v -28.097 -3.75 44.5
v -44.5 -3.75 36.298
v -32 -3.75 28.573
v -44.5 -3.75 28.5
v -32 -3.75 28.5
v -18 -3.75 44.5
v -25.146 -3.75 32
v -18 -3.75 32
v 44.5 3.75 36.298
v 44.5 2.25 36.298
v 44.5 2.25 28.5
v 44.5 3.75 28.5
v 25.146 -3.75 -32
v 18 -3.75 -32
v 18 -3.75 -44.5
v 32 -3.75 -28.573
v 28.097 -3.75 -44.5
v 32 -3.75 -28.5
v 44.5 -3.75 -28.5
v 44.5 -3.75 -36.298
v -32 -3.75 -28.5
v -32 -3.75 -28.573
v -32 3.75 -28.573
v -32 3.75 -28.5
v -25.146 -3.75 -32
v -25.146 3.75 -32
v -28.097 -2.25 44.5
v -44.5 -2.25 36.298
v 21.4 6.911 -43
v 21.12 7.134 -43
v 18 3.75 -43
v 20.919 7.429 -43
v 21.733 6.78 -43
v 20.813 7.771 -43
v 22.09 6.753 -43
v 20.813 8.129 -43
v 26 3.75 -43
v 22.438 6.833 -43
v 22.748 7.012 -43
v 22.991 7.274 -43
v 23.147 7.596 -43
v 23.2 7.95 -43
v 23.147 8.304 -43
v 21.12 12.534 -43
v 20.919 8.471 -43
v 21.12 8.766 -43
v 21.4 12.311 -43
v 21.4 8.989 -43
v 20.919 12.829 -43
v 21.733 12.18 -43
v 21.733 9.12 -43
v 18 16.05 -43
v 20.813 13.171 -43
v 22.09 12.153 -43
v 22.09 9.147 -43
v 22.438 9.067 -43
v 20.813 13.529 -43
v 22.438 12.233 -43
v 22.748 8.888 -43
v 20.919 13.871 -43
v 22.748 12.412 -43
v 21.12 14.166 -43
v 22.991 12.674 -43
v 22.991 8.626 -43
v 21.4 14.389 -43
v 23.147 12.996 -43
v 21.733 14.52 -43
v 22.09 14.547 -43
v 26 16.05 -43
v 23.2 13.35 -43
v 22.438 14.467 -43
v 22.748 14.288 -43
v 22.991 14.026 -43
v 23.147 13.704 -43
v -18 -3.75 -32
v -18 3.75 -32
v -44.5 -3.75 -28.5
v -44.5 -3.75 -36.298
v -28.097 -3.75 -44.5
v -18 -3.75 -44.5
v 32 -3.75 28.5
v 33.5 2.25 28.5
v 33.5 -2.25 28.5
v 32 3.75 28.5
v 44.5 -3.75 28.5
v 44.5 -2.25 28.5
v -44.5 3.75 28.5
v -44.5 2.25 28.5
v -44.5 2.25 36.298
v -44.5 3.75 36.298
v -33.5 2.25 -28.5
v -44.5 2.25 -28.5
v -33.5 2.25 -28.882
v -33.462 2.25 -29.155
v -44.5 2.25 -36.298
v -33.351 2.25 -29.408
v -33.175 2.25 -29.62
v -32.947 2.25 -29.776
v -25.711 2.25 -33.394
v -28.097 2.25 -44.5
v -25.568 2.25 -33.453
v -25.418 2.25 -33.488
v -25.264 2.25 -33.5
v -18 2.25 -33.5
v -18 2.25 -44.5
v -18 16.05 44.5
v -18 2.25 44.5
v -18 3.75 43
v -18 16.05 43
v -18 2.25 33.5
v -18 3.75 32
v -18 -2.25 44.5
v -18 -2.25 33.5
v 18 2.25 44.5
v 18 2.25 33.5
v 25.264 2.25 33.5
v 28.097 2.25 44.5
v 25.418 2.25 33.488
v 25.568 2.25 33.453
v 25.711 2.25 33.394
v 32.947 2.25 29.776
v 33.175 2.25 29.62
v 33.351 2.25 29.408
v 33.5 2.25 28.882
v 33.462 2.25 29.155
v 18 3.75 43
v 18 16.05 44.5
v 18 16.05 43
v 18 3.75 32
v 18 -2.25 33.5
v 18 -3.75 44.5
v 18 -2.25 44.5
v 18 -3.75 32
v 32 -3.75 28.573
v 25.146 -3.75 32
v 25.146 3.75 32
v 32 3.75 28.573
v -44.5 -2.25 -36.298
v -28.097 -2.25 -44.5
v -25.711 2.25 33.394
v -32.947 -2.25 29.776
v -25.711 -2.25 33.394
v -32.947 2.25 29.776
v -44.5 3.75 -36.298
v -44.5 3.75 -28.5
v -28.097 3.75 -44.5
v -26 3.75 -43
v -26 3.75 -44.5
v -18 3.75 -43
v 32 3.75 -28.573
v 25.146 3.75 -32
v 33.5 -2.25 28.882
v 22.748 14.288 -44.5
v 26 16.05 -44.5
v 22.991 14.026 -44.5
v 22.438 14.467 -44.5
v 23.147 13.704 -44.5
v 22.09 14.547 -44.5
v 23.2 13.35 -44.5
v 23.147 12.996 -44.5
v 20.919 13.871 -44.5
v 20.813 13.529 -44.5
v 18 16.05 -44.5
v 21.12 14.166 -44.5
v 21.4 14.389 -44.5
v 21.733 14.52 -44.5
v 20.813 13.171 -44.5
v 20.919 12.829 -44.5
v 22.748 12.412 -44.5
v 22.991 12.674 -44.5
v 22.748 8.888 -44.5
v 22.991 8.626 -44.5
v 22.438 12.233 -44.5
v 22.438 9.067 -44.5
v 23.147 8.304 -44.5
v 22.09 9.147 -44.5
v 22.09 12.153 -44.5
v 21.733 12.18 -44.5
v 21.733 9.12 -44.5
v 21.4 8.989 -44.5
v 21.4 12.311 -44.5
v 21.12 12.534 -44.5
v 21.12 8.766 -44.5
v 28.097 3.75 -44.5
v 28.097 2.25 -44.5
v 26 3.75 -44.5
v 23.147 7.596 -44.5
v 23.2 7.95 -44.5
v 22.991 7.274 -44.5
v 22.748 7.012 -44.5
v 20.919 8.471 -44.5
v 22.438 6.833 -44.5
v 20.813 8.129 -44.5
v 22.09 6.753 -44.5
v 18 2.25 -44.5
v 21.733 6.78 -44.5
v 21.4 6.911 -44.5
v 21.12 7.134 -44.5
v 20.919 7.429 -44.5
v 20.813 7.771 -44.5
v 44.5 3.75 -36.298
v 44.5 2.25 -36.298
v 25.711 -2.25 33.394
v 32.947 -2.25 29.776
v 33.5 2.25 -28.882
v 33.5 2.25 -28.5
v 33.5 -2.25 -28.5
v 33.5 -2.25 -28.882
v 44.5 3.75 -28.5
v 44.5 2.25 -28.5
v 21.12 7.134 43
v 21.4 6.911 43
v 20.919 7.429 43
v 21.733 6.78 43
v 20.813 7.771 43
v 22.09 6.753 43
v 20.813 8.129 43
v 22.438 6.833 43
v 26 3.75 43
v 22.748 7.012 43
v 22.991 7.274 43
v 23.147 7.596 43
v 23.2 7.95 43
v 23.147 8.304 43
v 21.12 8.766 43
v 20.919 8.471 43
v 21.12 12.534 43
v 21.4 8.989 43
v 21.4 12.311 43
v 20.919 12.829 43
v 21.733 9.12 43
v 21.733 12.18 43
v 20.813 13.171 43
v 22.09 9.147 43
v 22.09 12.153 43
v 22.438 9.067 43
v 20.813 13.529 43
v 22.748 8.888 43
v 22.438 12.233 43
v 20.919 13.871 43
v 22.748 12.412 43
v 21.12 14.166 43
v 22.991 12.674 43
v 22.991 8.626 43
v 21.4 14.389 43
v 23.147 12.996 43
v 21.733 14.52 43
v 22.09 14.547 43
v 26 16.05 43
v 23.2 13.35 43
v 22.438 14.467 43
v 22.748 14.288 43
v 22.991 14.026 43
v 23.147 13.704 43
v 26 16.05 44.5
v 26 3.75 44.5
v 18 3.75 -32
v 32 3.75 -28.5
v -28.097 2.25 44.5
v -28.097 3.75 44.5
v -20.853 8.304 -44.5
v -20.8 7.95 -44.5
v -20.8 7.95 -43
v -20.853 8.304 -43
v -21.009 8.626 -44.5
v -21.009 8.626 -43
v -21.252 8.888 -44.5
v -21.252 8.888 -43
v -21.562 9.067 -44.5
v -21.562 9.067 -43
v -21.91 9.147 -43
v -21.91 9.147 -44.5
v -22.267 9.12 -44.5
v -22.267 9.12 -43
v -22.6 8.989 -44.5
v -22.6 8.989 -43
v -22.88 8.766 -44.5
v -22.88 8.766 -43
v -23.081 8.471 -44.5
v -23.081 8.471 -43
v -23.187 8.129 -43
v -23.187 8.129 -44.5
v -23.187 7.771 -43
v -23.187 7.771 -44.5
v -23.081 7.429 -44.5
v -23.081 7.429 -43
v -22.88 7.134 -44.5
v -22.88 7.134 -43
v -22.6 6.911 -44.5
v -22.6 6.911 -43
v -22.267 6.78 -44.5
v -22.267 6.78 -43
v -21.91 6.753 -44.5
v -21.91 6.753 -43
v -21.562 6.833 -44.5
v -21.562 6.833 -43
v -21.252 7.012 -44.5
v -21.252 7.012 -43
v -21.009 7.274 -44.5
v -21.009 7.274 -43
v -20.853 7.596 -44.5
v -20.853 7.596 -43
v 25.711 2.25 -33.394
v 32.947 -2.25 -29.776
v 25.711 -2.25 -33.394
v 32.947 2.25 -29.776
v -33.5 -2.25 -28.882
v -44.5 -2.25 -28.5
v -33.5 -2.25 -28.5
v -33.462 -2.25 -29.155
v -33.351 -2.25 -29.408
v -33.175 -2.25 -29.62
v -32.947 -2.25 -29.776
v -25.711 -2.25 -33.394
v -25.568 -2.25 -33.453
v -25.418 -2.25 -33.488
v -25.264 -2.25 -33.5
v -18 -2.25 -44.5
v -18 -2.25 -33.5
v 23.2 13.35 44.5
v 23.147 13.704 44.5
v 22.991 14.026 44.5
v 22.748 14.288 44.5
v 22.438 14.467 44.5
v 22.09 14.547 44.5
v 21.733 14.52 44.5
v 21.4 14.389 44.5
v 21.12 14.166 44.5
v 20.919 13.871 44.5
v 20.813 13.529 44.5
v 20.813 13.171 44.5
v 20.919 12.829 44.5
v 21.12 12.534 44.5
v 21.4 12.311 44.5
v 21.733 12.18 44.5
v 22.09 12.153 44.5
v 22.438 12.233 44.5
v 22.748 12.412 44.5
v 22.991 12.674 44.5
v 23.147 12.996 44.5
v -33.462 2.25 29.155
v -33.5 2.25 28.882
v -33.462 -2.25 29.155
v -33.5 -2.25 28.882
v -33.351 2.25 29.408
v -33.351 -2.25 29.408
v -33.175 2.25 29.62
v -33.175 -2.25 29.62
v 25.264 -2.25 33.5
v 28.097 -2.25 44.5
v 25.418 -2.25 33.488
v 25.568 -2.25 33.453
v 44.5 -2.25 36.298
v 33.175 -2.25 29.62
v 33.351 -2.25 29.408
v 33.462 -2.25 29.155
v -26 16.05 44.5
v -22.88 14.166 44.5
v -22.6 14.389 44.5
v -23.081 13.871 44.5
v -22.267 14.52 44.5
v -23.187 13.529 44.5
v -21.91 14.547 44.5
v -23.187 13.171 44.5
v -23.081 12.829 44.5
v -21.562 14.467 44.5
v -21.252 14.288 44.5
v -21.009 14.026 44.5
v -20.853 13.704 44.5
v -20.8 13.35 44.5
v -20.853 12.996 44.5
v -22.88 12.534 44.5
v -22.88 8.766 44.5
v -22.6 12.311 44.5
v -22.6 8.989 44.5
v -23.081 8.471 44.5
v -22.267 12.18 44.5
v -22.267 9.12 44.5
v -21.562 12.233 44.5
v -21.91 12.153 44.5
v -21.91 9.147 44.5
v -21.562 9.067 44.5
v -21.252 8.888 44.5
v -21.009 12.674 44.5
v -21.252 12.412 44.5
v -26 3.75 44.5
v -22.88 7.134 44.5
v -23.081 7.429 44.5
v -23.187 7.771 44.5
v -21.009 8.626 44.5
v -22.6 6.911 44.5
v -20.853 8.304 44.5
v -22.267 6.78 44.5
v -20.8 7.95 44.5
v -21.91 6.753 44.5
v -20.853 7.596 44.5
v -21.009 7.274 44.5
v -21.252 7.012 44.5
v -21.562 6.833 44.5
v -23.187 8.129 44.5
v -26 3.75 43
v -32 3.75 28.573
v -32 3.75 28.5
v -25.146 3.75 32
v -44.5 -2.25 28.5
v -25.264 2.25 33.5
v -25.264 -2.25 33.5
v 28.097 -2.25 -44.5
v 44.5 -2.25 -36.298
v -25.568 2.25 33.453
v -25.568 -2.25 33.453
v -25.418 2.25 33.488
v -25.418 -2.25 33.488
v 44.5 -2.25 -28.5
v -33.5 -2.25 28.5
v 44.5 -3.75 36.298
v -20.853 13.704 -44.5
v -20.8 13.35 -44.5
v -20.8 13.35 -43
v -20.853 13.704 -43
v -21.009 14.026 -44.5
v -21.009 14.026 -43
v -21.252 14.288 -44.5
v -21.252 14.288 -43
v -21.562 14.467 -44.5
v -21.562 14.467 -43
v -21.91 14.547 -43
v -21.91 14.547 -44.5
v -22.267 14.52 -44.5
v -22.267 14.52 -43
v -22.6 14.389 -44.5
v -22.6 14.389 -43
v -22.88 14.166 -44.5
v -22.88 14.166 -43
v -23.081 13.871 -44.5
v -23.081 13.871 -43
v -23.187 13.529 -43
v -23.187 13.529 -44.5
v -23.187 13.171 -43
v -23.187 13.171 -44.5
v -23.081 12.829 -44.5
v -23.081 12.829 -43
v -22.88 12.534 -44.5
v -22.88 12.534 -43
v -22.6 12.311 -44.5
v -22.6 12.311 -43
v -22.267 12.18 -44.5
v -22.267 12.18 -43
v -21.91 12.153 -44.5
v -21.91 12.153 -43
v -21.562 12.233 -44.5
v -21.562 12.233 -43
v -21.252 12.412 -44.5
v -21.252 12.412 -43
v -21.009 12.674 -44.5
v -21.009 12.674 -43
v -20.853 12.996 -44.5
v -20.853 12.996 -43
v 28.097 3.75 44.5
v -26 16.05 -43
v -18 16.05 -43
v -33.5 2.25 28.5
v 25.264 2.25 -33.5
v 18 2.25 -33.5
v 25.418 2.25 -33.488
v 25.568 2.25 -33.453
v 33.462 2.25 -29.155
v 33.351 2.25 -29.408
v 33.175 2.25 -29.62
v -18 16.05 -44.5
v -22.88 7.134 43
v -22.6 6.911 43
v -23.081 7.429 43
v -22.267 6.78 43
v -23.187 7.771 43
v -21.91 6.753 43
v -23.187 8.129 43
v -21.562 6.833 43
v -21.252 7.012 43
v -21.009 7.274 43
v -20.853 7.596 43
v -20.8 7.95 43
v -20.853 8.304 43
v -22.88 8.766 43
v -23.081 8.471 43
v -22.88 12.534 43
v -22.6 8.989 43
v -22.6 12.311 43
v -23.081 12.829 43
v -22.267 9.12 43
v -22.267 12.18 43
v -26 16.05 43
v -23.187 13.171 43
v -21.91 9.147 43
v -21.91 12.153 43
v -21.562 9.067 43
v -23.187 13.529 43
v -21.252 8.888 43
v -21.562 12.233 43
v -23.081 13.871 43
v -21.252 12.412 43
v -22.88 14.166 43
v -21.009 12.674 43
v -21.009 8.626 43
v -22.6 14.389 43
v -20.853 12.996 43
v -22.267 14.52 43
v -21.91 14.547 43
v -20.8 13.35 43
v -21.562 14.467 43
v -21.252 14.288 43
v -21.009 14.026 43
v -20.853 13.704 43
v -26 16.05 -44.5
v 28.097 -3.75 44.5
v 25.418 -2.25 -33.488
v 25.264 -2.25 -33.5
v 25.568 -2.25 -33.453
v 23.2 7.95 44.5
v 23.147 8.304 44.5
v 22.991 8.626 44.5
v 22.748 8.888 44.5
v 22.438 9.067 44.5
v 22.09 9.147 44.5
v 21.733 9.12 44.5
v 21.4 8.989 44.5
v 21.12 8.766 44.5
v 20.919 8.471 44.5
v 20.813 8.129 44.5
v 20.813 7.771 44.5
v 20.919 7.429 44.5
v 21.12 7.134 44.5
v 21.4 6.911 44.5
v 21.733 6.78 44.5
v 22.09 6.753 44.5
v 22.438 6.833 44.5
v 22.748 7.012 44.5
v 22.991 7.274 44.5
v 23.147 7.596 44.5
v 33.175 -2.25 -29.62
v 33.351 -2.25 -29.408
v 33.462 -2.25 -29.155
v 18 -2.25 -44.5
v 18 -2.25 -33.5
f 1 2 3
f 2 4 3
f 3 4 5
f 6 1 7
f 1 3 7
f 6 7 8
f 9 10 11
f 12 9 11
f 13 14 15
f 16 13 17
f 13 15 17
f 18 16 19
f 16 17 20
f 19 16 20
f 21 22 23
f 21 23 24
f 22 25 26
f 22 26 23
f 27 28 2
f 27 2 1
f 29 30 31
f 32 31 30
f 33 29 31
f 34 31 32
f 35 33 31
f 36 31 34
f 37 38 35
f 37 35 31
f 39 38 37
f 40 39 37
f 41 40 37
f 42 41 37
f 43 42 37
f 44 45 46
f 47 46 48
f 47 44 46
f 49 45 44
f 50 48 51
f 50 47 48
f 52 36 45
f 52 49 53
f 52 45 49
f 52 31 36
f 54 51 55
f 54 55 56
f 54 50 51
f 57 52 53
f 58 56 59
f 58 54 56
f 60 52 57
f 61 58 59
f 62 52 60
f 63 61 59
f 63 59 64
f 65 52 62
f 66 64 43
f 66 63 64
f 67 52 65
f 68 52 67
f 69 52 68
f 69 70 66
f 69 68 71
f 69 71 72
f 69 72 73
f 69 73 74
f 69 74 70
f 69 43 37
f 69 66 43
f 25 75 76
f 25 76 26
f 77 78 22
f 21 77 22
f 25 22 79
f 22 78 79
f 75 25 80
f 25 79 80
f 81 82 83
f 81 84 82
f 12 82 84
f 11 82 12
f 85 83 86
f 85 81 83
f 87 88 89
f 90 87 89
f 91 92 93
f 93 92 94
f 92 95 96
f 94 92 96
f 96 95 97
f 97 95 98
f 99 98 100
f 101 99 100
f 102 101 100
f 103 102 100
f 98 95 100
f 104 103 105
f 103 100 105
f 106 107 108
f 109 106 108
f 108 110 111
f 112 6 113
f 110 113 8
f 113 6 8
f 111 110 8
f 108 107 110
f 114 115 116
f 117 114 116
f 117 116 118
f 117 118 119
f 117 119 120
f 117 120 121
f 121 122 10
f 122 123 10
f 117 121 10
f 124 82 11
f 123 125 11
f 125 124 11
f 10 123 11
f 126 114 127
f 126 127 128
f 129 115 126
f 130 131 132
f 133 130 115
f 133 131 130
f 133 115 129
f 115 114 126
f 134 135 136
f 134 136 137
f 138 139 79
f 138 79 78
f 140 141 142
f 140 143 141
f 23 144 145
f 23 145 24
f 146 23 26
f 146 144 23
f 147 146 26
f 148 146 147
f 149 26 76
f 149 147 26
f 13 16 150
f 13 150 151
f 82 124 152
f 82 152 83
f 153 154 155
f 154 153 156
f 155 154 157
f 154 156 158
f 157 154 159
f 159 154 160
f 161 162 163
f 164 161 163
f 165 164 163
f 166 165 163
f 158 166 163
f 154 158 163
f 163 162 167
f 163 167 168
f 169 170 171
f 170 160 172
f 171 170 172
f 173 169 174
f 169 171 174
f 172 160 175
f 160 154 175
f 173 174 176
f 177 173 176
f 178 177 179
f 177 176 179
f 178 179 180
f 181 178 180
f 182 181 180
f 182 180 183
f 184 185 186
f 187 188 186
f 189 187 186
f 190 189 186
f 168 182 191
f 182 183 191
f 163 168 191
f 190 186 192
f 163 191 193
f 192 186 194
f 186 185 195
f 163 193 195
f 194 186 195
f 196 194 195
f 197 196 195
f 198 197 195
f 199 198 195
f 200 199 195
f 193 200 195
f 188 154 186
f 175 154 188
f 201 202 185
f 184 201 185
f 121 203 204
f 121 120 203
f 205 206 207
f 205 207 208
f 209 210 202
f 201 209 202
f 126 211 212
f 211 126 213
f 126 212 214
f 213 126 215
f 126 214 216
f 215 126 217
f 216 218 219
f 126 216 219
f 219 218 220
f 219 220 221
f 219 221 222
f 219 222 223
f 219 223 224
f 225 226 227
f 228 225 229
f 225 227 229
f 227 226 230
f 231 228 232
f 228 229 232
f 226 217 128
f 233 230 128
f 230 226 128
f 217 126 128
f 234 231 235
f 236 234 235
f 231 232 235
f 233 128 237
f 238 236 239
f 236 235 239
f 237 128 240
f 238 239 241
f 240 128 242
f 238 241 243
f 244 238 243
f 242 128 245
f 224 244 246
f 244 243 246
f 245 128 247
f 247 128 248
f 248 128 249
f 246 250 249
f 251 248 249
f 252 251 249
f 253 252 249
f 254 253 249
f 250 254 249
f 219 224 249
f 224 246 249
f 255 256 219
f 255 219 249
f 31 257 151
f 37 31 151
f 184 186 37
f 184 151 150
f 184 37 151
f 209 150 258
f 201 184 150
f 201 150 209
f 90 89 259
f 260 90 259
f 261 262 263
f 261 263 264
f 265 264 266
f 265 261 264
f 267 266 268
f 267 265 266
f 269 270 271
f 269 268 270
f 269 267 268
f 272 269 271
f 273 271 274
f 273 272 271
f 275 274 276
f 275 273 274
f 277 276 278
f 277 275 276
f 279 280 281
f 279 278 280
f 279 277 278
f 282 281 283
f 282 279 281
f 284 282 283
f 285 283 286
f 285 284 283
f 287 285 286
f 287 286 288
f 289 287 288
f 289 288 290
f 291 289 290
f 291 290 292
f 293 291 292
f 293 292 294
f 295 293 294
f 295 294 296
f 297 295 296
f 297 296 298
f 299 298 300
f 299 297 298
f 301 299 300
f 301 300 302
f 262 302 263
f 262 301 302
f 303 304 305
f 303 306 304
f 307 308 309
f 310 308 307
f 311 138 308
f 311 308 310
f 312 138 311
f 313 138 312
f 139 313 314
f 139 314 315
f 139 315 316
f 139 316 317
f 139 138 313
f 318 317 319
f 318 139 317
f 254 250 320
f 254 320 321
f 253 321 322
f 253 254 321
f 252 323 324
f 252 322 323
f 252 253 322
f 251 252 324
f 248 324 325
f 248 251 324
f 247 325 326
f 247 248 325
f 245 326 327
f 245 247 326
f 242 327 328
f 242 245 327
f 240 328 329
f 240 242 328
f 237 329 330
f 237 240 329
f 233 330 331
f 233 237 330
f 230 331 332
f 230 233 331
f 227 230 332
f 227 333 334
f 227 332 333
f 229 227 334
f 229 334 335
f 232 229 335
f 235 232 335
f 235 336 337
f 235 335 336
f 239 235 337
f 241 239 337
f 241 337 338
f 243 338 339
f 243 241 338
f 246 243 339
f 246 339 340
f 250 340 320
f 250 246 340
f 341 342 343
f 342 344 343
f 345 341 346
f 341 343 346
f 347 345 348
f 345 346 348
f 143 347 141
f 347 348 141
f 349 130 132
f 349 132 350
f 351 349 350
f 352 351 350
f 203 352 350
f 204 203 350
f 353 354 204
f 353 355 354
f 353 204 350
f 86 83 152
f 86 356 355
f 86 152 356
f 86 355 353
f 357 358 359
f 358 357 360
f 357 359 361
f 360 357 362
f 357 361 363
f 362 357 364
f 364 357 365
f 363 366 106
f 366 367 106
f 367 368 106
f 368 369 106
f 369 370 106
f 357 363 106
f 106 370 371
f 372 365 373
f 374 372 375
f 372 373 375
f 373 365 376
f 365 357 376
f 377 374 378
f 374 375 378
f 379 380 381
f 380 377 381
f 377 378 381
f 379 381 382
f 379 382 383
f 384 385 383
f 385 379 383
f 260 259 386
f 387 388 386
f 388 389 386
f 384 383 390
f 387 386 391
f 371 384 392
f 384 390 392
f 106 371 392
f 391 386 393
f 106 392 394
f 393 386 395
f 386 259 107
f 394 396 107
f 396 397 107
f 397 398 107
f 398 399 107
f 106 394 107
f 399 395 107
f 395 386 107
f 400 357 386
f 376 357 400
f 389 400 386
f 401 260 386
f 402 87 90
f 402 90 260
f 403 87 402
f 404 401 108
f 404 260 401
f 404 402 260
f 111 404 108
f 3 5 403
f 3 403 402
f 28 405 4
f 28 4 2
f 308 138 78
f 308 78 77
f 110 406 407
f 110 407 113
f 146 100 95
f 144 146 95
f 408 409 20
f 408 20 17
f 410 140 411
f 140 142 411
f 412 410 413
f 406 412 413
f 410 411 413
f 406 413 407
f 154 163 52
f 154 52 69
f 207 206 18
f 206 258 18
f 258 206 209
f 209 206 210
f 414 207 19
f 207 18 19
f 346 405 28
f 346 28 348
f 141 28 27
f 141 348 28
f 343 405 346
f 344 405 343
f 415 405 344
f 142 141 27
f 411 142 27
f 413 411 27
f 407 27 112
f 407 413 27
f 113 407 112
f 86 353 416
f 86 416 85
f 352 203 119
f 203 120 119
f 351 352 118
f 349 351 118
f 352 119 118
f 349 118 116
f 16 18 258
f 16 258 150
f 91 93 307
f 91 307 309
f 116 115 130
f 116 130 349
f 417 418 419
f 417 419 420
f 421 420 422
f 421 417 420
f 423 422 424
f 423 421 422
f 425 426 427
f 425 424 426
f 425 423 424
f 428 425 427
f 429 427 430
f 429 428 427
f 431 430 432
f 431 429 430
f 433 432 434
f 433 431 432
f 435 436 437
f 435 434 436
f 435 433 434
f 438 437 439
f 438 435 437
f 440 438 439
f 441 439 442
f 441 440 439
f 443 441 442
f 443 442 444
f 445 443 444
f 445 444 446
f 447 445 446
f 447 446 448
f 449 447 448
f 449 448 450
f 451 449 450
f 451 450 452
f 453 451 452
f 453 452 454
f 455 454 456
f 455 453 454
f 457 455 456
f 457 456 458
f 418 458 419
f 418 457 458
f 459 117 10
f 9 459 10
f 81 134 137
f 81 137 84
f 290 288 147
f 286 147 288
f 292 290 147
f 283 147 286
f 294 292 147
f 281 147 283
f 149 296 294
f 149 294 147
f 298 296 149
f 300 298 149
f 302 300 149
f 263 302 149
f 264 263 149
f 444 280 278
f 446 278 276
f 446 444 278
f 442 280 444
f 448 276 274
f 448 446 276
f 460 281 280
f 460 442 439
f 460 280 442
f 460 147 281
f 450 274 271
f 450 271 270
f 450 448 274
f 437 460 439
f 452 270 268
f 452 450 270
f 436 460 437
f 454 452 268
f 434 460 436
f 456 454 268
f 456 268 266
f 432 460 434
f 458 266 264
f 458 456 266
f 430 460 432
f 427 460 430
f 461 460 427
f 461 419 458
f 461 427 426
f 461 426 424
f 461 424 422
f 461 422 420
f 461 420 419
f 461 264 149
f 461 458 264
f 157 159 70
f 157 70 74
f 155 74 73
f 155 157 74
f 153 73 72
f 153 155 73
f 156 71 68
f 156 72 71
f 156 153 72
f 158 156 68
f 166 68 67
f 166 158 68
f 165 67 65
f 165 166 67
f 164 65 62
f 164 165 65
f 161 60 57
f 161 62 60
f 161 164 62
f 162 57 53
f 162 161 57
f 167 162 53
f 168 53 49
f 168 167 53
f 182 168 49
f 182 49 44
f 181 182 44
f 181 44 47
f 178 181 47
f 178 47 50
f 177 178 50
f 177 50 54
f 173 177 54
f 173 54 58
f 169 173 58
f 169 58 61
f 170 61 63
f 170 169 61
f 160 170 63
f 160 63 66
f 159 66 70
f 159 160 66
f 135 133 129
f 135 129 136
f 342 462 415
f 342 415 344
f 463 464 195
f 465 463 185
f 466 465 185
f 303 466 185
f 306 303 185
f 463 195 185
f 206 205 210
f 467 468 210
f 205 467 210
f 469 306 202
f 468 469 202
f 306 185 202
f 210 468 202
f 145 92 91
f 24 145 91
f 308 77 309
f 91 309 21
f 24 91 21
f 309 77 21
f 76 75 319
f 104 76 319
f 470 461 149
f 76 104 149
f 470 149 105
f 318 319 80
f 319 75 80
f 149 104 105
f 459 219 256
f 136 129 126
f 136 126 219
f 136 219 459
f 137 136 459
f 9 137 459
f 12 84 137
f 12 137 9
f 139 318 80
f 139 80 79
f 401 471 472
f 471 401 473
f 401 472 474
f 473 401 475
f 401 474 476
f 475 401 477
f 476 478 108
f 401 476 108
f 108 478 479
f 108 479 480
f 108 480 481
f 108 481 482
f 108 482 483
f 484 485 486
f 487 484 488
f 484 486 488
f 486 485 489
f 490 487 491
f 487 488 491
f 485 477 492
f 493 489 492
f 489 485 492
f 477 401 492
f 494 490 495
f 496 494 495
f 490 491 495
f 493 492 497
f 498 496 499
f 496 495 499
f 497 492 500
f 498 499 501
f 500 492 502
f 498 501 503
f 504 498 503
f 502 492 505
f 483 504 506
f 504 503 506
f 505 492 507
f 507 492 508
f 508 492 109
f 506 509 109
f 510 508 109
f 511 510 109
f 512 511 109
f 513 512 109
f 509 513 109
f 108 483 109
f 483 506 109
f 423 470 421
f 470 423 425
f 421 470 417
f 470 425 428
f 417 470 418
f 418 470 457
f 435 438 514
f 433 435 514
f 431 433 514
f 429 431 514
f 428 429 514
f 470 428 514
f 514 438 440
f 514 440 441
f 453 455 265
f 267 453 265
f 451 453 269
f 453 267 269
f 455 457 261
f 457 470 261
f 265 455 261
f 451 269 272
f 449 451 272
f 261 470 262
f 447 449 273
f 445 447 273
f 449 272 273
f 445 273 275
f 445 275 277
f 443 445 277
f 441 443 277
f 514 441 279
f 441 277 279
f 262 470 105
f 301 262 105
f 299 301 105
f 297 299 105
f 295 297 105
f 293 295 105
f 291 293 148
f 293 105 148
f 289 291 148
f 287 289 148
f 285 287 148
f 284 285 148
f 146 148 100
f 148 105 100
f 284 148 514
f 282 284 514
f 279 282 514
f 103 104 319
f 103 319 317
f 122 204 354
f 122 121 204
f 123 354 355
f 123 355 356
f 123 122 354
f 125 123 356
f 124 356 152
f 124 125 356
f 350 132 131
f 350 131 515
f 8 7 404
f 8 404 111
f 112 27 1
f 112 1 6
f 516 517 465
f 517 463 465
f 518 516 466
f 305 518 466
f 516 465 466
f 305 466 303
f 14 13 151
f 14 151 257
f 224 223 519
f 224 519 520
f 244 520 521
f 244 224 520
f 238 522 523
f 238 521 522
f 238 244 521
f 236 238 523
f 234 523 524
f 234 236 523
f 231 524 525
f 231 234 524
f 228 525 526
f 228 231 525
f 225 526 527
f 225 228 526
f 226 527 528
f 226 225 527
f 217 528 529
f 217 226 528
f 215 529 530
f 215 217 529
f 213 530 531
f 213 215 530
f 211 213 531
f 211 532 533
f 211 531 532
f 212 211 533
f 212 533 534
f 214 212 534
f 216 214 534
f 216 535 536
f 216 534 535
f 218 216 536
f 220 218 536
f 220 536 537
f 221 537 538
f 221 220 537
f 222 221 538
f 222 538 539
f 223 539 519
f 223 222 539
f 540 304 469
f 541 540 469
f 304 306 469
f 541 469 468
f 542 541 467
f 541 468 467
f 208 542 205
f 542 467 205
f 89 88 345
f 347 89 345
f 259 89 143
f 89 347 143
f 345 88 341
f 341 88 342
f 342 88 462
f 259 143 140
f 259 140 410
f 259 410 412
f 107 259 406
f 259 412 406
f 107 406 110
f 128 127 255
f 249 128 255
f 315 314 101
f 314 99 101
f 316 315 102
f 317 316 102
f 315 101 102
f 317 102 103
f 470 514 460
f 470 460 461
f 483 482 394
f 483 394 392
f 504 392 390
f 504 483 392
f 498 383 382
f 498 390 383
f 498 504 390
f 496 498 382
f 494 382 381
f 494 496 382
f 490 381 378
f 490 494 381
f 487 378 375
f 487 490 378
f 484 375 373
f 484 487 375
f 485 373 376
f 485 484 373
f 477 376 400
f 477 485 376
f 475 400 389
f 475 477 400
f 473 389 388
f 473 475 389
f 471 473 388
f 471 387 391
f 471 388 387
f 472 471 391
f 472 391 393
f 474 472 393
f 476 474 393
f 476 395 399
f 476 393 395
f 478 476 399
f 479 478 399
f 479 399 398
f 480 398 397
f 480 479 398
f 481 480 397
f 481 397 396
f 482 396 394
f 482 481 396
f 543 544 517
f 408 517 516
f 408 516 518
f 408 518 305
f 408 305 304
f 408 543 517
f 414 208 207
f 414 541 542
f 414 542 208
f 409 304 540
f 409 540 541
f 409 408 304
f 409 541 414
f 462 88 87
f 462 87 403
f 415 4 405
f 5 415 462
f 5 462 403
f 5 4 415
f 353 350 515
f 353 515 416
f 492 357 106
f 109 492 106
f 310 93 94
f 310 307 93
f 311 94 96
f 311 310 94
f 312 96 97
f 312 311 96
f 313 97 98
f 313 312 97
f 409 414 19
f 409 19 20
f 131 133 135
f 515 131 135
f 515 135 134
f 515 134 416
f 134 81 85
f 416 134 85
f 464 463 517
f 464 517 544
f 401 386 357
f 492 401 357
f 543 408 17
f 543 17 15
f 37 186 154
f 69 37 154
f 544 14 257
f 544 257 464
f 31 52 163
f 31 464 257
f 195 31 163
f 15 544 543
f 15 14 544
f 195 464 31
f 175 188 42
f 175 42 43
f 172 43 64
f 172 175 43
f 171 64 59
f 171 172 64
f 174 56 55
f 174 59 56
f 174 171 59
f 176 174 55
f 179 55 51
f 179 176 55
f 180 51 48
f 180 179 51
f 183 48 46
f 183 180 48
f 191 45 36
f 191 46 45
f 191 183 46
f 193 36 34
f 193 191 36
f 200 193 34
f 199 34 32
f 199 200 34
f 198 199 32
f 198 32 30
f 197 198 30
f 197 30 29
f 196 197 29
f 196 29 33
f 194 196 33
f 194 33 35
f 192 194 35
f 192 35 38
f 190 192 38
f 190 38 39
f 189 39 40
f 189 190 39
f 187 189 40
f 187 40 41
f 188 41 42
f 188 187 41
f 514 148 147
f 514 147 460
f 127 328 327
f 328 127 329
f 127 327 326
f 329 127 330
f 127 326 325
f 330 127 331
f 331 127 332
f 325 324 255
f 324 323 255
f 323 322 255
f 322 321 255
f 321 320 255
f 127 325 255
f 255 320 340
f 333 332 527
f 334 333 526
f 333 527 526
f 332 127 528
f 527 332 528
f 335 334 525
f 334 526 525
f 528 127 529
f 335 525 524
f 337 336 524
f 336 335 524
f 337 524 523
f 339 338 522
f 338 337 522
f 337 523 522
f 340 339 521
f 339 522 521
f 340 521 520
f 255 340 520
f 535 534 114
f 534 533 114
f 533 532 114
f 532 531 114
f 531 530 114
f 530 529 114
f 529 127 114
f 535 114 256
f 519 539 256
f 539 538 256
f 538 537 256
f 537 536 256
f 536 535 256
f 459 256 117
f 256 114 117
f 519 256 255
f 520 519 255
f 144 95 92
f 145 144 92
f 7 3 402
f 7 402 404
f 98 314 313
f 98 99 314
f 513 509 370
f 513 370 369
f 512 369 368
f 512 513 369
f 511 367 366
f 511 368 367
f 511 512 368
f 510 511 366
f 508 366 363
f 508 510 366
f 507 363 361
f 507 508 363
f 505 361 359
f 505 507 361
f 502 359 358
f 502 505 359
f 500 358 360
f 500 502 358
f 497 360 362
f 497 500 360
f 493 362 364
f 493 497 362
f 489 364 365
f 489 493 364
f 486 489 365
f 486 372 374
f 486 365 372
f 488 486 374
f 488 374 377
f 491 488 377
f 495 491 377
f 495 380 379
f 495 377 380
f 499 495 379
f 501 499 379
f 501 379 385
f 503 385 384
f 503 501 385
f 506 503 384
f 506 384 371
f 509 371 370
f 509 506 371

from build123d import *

# Parameters (mm, degrees)
BOSS_EXTRUDE1_DEPTH     = 2.25
BOSS_EXTRUDE2_DEPTH     = 1.5
CUT_EXTRUDE1_DEPTH      = 64.044131368
CUT_EXTRUDE1_DEPTH_BACK = 64.044131368
BOSS_EXTRUDE3_START     = 44.5
SKETCH5_W               = 8
SKETCH5_H               = 12.3
BOSS_EXTRUDE3_DEPTH     = 1.5
BOSS_EXTRUDE4_START     = -44.5
SKETCH5_2_W             = 8
SKETCH5_2_H             = 12.3
BOSS_EXTRUDE4_DEPTH     = 1.5
CUT_EXTRUDE3_DEPTH      = 65.946920635
CUT_EXTRUDE3_DEPTH_BACK = 65.946920635
SKETCH6_R               = 1.2
CUT_EXTRUDE6_DEPTH      = 65.946920635
CUT_EXTRUDE6_DEPTH_BACK = 65.946920635
SKETCH7_W               = 89
SKETCH7_H               = 57
CUT_EXTRUDE7_DEPTH      = 65.946920635
CUT_EXTRUDE7_DEPTH_BACK = 65.946920635
SKETCH8_W               = 36
SKETCH8_H               = 89
FILLET1_R               = 1
FILLET2_R               = 1
FILLET3_R               = 1
FILLET4_R               = 1


with BuildPart() as part:
    # Sketch1 → Boss-Extrude1 (new, symmetric)
    with BuildSketch(Plane(origin=(0, 0, 0), x_dir=(1, 0, 0), z_dir=(0, 1, 0))):
        Polygon((-25.5, -33.5), (25.5, -33.5), (33.5, -29.5), (33.5, 29.5), (25.5, 33.5), (-25.5, 33.5), (-33.5, 29.5), (-33.5, -29.5), align=None)
    extrude(amount=BOSS_EXTRUDE1_DEPTH, both=True)

    # Sketch2 → Boss-Extrude2 (add)
    with BuildSketch(Plane(origin=(0, 2.25, 0), x_dir=(1, 0, 0), z_dir=(0, 1, 0))):
        Polygon((28.096747752, -44.5), (44.5, -36.298373876), (44.5, 36.298373876), (28.096747752, 44.5), (-28.096747752, 44.5), (-44.5, 36.298373876), (-44.5, -36.298373876), (-28.096747752, -44.5), align=None)
    boss_extrude2 = extrude(amount=BOSS_EXTRUDE2_DEPTH)

    # Mirror1: Boss-Extrude2 across plane
    add(boss_extrude2.mirror(Plane.ZX))

    # Sketch3 → Cut-Extrude1 (cut, two sides: drawn at the far end of the back side and taken through both)
    with BuildSketch(Plane(origin=(0, 0, 0), x_dir=(1, 0, 0), z_dir=(0, 1, 0)).offset(-CUT_EXTRUDE1_DEPTH_BACK)):
        Polygon((-25.145898034, -32), (25.145898034, -32), (32, -28.572949017), (32, 28.572949017), (25.145898034, 32), (-25.145898034, 32), (-32, 28.572949017), (-32, -28.572949017), align=None)
    extrude(amount=CUT_EXTRUDE1_DEPTH + CUT_EXTRUDE1_DEPTH_BACK, mode=Mode.SUBTRACT)

    # Sketch5 → Boss-Extrude3 (add)
    with BuildSketch(Plane.XY.offset(BOSS_EXTRUDE3_START)):
        with Locations((-22, 9.9)):
            Rectangle(SKETCH5_W, SKETCH5_H)
        with Locations((22, 9.9)):
            Rectangle(SKETCH5_W, SKETCH5_H)
    extrude(amount=-BOSS_EXTRUDE3_DEPTH)

    # Sketch5<2> → Boss-Extrude4 (add)
    with BuildSketch(Plane.XY.offset(BOSS_EXTRUDE4_START)):
        with Locations((-22, 9.9)):
            Rectangle(SKETCH5_2_W, SKETCH5_2_H)
        with Locations((22, 9.9)):
            Rectangle(SKETCH5_2_W, SKETCH5_2_H)
    extrude(amount=BOSS_EXTRUDE4_DEPTH)

    # Sketch6 → Cut-Extrude3 (cut, two sides: drawn at the far end of the back side and taken through both)
    with BuildSketch(Plane.XY.offset(-CUT_EXTRUDE3_DEPTH_BACK)):
        with Locations((-22, 13.35)):
            Circle(SKETCH6_R)
        with Locations((22, 13.35)):
            Circle(SKETCH6_R)
        with Locations((22, 7.95)):
            Circle(SKETCH6_R)
        with Locations((-22, 7.95)):
            Circle(SKETCH6_R)
    extrude(amount=CUT_EXTRUDE3_DEPTH + CUT_EXTRUDE3_DEPTH_BACK, mode=Mode.SUBTRACT)

    # Sketch7 → Cut-Extrude6 (cut, two sides: drawn at the far end of the back side and taken through both)
    with BuildSketch(Plane(origin=(0, 0, 0), x_dir=(1, 0, 0), z_dir=(0, 1, 0)).offset(-CUT_EXTRUDE6_DEPTH_BACK)):
        Rectangle(SKETCH7_W, SKETCH7_H)
    extrude(amount=CUT_EXTRUDE6_DEPTH + CUT_EXTRUDE6_DEPTH_BACK, mode=Mode.SUBTRACT)


with BuildPart() as cut_extrude6_piece_1:
    # of the separate pieces the step leaves, piece 1, a body of its own (cut_extrude6_pieces)
    add(part.part.solids().sort_by_distance((28.096747752, -2.25, 44.5))[0])


with BuildPart() as cut_extrude6_piece_2:
    # of the separate pieces the step leaves, piece 2, a body of its own (cut_extrude6_pieces)
    add(part.part.solids().sort_by_distance((44.5, -2.25, -28.5))[0])


with BuildPart() as cut_extrude7_tool:
    # Sketch8 → Cut-Extrude7 (new, two sides: drawn at the far end of the back side and taken through both)
    with BuildSketch(Plane(origin=(0, 0, 0), x_dir=(1, 0, 0), z_dir=(0, 1, 0)).offset(-CUT_EXTRUDE7_DEPTH_BACK)):
        Rectangle(SKETCH8_W, SKETCH8_H)
    extrude(amount=CUT_EXTRUDE7_DEPTH + CUT_EXTRUDE7_DEPTH_BACK)


with BuildPart() as cut_extrude6_piece_1_1:
    add(cut_extrude6_piece_1.part)

    # Cut-Extrude7: cut by cut_extrude7_tool
    add(cut_extrude7_tool.part, mode=Mode.SUBTRACT)


with BuildPart() as cut_extrude6_piece_2_1:
    add(cut_extrude6_piece_2.part)

    # Cut-Extrude7: cut by cut_extrude7_tool
    add(cut_extrude7_tool.part, mode=Mode.SUBTRACT)


with BuildPart() as cut_extrude7_piece_1:
    # of the separate pieces the step leaves, piece 1, a body of its own (cut_extrude7_pieces)
    add(cut_extrude6_piece_1_1.part.solids().sort_by_distance((28.096747752, -2.25, 44.5))[0])

    # Fillet1
    fillet1_edges = [cut_extrude7_piece_1.edges().sort_by_distance(p)[0] for p in [
        (33.5, 0, 29.5),
        (25.5, 0, 33.5),
    ]]
    fillet(fillet1_edges, radius=FILLET1_R)


with BuildPart() as cut_extrude7_piece_2:
    # of the separate pieces the step leaves, piece 2, a body of its own (cut_extrude7_pieces)
    add(cut_extrude6_piece_1_1.part.solids().sort_by_distance((-28.096747752, -2.25, 44.5))[0])

    # Fillet4
    fillet4_edges = [cut_extrude7_piece_2.edges().sort_by_distance(p)[0] for p in [
        (-33.5, 0, 29.5),
        (-25.5, 0, 33.5),
    ]]
    fillet(fillet4_edges, radius=FILLET4_R)


with BuildPart() as cut_extrude7_piece_1_of_cut_extrude6_pie:
    # of the separate pieces the step leaves, piece 1, a body of its own (cut_extrude7_pieces_of_cut_extrude6_piec)
    add(cut_extrude6_piece_2_1.part.solids().sort_by_distance((44.5, -2.25, -28.5))[0])

    # Fillet2
    fillet2_edges = [cut_extrude7_piece_1_of_cut_extrude6_pie.edges().sort_by_distance(p)[0] for p in [
        (25.5, 0, -33.5),
        (33.5, 0, -29.5),
    ]]
    fillet(fillet2_edges, radius=FILLET2_R)


with BuildPart() as cut_extrude7_piece_2_of_cut_extrude6_pie:
    # of the separate pieces the step leaves, piece 2, a body of its own (cut_extrude7_pieces_of_cut_extrude6_piec)
    add(cut_extrude6_piece_2_1.part.solids().sort_by_distance((-18, -2.25, -33.5))[0])

    # Fillet3
    fillet3_edges = [cut_extrude7_piece_2_of_cut_extrude6_pie.edges().sort_by_distance(p)[0] for p in [
        (-33.5, 0, -29.5),
        (-25.5, 0, -33.5),
    ]]
    fillet(fillet3_edges, radius=FILLET3_R)


solid = Compound([cut_extrude7_piece_1.part, cut_extrude7_piece_2.part, cut_extrude7_piece_1_of_cut_extrude6_pie.part, cut_extrude7_piece_2_of_cut_extrude6_pie.part])
